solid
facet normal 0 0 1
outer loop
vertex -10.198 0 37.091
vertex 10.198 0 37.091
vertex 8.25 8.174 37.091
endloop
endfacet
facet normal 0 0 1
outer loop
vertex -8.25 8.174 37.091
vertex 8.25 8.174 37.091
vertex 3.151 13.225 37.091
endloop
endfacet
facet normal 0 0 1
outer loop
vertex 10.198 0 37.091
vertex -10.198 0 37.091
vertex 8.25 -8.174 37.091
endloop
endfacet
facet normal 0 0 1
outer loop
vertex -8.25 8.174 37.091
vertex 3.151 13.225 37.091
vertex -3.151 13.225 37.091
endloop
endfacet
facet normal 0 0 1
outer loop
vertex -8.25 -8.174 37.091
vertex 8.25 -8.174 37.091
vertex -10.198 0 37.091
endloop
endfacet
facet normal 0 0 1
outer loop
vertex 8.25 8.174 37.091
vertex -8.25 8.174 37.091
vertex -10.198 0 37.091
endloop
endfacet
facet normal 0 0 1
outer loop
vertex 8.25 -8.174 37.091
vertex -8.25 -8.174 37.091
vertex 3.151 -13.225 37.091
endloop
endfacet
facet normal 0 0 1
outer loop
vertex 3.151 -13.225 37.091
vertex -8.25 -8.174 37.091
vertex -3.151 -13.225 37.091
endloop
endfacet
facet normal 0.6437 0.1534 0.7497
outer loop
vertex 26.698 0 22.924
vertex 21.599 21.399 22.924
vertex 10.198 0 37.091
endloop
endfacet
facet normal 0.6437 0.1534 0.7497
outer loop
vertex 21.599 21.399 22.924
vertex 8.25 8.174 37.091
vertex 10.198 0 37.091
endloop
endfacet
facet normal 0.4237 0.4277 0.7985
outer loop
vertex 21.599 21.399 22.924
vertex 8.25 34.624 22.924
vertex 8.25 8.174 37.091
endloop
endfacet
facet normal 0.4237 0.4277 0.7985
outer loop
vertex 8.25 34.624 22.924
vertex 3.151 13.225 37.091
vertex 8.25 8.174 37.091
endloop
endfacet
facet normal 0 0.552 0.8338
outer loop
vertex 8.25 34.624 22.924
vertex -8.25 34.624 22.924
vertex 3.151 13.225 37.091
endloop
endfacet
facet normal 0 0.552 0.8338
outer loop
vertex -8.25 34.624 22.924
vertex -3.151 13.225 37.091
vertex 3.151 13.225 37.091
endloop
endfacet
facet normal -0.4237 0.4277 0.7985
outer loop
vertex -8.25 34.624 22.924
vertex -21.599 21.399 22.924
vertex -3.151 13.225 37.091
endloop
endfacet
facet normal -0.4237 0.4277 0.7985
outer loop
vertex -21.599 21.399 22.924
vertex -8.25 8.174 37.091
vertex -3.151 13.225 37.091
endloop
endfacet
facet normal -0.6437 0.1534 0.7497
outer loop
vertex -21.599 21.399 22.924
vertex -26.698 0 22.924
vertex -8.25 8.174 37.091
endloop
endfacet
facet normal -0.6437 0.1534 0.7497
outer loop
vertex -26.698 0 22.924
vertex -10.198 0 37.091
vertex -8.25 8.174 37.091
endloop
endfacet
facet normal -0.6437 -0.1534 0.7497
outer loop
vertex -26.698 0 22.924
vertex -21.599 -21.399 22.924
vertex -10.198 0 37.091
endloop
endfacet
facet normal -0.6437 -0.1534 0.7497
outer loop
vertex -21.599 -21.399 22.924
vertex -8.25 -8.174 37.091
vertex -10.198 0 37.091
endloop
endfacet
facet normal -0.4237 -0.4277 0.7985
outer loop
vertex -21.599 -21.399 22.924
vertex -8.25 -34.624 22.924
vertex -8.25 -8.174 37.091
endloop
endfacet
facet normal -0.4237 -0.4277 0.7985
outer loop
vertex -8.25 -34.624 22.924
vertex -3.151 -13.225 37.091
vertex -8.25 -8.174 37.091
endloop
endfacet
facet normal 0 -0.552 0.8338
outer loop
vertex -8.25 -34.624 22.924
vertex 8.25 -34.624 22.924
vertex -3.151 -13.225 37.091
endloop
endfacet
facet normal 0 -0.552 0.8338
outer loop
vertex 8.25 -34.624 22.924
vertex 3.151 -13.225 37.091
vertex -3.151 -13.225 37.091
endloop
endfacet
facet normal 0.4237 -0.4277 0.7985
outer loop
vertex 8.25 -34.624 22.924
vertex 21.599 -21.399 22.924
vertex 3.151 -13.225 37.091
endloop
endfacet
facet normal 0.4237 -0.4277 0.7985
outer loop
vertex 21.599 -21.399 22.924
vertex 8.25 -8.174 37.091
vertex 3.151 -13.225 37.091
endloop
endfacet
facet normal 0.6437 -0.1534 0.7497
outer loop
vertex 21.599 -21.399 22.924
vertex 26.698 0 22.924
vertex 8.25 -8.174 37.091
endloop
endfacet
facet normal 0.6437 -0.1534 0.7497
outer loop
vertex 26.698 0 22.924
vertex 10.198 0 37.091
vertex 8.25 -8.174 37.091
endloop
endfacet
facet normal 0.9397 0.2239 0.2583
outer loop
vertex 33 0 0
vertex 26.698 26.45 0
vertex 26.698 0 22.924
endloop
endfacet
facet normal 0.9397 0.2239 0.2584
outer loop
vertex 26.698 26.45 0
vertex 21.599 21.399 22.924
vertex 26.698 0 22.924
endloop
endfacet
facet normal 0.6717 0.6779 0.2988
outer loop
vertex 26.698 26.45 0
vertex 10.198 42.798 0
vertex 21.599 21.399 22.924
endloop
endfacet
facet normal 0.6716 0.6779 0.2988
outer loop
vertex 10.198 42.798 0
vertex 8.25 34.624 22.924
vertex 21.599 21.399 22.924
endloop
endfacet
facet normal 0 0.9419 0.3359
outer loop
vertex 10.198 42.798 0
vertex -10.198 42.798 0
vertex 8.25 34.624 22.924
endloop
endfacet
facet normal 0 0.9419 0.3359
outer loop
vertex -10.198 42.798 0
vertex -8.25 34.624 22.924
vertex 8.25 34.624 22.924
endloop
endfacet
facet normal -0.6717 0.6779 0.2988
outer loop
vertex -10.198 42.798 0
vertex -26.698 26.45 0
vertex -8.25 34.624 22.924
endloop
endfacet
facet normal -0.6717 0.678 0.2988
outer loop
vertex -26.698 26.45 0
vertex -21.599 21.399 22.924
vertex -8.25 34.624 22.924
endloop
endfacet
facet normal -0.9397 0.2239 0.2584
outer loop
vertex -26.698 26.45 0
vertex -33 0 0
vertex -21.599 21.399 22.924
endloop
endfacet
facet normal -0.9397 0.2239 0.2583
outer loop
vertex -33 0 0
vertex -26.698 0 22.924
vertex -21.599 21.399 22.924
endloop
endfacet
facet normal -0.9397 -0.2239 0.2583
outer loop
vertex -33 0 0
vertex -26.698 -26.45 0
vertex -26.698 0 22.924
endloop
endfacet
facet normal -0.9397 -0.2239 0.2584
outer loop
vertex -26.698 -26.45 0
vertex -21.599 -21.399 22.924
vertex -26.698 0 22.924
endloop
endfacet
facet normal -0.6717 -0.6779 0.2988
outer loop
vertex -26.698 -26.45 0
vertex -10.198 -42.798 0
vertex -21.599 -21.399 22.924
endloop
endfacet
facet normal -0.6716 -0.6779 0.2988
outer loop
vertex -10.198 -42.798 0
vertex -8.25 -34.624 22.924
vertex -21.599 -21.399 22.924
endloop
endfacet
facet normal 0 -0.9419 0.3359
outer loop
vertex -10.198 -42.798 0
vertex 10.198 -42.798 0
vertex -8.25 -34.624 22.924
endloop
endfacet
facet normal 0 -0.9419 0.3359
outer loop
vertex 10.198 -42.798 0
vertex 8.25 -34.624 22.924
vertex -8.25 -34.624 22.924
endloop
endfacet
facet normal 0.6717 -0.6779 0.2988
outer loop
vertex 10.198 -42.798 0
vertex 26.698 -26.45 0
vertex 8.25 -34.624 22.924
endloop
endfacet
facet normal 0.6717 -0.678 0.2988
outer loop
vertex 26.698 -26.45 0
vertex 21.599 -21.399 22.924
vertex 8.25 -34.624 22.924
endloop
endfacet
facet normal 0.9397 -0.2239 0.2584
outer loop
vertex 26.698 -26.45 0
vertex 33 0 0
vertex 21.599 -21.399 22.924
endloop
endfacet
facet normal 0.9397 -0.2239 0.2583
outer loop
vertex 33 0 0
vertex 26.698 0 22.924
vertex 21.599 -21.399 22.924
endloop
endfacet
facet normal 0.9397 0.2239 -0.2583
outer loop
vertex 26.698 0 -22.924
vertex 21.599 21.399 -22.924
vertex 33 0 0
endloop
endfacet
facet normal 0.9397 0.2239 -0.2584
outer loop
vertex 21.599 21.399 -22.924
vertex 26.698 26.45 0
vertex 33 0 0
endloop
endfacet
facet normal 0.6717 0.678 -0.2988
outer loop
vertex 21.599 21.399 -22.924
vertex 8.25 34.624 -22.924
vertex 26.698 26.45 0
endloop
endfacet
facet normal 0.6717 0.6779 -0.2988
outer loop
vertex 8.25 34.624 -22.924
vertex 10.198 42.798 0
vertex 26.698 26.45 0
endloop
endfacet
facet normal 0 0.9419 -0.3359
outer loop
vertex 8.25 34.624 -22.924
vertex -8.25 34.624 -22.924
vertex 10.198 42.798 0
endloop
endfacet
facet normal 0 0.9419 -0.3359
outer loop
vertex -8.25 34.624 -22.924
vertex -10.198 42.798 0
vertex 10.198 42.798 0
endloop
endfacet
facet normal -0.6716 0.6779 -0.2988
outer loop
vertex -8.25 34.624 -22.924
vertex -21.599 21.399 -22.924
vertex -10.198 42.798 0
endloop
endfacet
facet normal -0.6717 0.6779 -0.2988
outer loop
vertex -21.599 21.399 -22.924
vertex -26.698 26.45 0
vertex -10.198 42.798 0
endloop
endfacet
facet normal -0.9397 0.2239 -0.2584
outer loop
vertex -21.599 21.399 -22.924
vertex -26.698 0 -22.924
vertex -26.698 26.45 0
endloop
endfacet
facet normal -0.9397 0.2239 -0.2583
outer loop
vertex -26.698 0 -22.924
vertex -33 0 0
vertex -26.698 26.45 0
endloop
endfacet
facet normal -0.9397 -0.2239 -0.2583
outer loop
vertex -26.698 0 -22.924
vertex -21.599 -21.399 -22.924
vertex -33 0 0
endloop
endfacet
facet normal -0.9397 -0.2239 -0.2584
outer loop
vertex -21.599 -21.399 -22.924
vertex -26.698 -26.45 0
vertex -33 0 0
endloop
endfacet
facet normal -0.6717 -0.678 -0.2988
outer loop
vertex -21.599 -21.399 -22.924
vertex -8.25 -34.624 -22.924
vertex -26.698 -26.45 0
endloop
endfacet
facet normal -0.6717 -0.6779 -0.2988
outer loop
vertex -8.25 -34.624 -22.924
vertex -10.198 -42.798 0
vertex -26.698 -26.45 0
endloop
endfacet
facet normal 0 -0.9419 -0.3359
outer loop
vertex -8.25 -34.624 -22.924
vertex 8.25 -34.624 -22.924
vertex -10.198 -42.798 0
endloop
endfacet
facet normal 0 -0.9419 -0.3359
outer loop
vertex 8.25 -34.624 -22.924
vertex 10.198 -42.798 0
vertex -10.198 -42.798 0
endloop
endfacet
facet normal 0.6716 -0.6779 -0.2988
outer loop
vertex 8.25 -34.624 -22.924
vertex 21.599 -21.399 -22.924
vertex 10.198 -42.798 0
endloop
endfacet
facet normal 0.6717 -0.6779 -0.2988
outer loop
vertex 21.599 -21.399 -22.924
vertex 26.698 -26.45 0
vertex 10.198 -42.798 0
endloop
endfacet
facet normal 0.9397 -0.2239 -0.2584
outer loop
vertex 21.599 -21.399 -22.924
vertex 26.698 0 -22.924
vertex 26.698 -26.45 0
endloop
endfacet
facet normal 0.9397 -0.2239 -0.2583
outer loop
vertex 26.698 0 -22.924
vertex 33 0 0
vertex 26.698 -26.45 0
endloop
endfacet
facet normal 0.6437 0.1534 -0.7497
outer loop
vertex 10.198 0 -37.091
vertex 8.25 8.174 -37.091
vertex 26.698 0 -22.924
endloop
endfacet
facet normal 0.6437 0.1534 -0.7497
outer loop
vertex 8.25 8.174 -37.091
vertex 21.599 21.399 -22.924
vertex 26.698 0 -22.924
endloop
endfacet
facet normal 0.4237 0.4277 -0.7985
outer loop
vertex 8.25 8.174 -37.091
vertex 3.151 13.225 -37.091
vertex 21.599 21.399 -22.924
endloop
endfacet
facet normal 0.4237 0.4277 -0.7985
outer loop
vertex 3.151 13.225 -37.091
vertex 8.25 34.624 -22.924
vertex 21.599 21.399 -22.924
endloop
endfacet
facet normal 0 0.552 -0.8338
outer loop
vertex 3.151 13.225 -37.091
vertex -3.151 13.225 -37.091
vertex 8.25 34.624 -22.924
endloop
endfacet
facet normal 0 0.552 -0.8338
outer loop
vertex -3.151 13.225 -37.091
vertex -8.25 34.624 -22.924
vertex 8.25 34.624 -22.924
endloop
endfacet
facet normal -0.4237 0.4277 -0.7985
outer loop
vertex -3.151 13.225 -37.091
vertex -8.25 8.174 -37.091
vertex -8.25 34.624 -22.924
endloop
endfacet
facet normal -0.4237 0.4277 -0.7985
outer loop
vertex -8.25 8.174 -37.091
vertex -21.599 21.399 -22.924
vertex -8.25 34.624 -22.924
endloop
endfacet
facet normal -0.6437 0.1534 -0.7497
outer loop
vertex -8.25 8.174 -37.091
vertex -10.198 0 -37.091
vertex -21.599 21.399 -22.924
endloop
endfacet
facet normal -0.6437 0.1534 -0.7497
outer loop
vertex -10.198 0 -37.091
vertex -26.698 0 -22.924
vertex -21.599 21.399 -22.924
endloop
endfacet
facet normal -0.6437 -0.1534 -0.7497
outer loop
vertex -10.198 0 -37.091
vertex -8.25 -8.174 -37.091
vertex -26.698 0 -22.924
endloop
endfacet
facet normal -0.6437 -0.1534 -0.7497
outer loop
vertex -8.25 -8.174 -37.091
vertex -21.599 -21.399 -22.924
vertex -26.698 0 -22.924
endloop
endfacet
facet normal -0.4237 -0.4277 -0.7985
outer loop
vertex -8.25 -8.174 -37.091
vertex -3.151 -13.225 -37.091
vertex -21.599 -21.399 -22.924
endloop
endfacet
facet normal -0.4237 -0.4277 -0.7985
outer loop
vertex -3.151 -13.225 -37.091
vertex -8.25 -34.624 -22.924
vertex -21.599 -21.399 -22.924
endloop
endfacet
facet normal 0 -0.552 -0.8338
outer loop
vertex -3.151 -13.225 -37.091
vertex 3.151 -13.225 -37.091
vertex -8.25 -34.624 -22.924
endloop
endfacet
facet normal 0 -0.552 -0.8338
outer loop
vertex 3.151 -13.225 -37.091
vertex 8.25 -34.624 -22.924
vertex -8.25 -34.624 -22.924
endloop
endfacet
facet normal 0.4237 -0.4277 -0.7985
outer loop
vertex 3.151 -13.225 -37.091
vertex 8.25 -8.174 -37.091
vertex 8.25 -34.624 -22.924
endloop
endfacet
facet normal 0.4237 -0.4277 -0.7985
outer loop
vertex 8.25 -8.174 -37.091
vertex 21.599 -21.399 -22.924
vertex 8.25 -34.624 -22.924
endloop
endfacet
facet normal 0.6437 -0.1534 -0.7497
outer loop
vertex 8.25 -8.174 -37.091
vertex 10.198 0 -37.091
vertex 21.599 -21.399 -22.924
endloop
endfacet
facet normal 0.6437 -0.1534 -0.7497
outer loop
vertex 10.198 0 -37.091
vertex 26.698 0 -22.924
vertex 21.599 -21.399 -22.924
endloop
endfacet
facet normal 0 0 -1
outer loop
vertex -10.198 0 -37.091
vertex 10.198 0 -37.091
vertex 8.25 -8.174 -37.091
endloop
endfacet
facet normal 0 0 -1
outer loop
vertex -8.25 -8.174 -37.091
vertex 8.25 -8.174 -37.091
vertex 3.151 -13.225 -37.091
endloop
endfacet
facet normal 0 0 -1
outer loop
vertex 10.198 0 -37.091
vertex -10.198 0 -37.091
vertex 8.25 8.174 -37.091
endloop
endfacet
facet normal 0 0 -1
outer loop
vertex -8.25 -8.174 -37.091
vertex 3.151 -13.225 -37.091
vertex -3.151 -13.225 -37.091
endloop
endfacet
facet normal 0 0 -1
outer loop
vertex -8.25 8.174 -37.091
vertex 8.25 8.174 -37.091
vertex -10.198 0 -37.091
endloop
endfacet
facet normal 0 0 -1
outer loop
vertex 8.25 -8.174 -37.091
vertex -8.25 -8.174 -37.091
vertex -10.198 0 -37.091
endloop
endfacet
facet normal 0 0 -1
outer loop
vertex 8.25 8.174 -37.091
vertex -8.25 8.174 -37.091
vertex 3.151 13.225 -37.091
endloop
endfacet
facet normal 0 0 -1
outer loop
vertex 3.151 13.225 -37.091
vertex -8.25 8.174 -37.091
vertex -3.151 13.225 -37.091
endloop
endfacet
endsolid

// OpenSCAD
// Generated by SolidPython 1.0.1 on 2020-07-29 00:46:50


scale(v = [11, 15, 13]) {
	sphere(r = 3);
}
/***********************************************
*********      SolidPython code:      **********
************************************************
 
# import packages: SolidPython
from solid import *
from solid.utils import *
from itertools import chain, combinations, permutations


class Resize:

    def __init__(self, scad_file):
        self.scad_file = scad_file
        #self.scad_file = import_scad(scad_file)
        # cone/cylinder param:
        self.r1 = 0
        self.r2 = 0
        self.h = 0
        # rectangular prism param:
        self.w = 0
        self.l = 0
        # ellipse param:
        self.r = 0

    # import OpenScad code (file name corresponds to shape)


    # classify shape + parameters
    def assign(self, param1, param2, param3):
        if self.scad_file == 'cone.scad':
            self.r1 = param1
            self.r2 = param2
            self.h = param3
        elif self.scad_file == 'cylinder.scad':
            self.r1 = param1
            self.r2 = param2
            self.h = param3
        elif self.scad_file == 'rectangularPrism.scad':
            self.h = param1
            self.l = param2
            self.w = param3
        else:
            self.r = param1
            self.h = param2

    # resize parameters
    def iterate(self):
        x = range(3, 20, 2)
        i = 1
        if self.scad_file == 'cone.scad':
            tempList = list(permutations(x, 2))
            for temp in tempList:
                param1 = temp[0]
                param2 = temp[1]
                filepath = 'produced_scad_files/' + 'cone' + str(param1) + '_' + str(param2) + '_' + '.scad'
                scad_render_to_file(cylinder(h=param1, r1=param2, r2=0), filepath)

        elif self.scad_file == 'cylinder.scad':
            tempList = list(permutations(x, 3))
            for temp in tempList:
                param1 = temp[0]
                param2 = temp[1]
                filepath = 'produced_scad_files/' + 'cylinder' + str(param1) + '_' + str(param2) + '_' + '.scad'
                scad_render_to_file(cylinder(h=param1, r1=param2, r2=param2), filepath)

        elif self.scad_file == 'rectangularPrism.scad':
            tempList = list(permutations(x, 3))
            for temp in tempList:
                param1 = temp[0]
                param2 = temp[1]
                param3 = temp[2]
                filepath = 'produced_scad_files/' + 'rectangularPrism' + str(param1) + '_' + str(param2) + '_' + str(
                    param3) + '.scad'
                scad_render_to_file(cube(size=(param1, param2, param3)), filepath)

        elif self.scad_file == 'ellipse.scad':
            tempList = list(permutations(x, 4))
            for temp in tempList:
                param1 = temp[0]
                param2 = temp[1]
                param3 = temp[2]
                param4 = temp[3]
                filepath = 'produced_scad_files/' + 'ellipse' + str(param1) + '_' + str(param2) + '_' + str(param3) + '_' + str(param4) + '.scad'
                scad_render_to_file(scale([param1, param2, param3])(sphere(r=param4)), filepath)

    def render_to_scadfile(self):
        scad_render_to_file(scad, 'example.scad') 
 
************************************************/
